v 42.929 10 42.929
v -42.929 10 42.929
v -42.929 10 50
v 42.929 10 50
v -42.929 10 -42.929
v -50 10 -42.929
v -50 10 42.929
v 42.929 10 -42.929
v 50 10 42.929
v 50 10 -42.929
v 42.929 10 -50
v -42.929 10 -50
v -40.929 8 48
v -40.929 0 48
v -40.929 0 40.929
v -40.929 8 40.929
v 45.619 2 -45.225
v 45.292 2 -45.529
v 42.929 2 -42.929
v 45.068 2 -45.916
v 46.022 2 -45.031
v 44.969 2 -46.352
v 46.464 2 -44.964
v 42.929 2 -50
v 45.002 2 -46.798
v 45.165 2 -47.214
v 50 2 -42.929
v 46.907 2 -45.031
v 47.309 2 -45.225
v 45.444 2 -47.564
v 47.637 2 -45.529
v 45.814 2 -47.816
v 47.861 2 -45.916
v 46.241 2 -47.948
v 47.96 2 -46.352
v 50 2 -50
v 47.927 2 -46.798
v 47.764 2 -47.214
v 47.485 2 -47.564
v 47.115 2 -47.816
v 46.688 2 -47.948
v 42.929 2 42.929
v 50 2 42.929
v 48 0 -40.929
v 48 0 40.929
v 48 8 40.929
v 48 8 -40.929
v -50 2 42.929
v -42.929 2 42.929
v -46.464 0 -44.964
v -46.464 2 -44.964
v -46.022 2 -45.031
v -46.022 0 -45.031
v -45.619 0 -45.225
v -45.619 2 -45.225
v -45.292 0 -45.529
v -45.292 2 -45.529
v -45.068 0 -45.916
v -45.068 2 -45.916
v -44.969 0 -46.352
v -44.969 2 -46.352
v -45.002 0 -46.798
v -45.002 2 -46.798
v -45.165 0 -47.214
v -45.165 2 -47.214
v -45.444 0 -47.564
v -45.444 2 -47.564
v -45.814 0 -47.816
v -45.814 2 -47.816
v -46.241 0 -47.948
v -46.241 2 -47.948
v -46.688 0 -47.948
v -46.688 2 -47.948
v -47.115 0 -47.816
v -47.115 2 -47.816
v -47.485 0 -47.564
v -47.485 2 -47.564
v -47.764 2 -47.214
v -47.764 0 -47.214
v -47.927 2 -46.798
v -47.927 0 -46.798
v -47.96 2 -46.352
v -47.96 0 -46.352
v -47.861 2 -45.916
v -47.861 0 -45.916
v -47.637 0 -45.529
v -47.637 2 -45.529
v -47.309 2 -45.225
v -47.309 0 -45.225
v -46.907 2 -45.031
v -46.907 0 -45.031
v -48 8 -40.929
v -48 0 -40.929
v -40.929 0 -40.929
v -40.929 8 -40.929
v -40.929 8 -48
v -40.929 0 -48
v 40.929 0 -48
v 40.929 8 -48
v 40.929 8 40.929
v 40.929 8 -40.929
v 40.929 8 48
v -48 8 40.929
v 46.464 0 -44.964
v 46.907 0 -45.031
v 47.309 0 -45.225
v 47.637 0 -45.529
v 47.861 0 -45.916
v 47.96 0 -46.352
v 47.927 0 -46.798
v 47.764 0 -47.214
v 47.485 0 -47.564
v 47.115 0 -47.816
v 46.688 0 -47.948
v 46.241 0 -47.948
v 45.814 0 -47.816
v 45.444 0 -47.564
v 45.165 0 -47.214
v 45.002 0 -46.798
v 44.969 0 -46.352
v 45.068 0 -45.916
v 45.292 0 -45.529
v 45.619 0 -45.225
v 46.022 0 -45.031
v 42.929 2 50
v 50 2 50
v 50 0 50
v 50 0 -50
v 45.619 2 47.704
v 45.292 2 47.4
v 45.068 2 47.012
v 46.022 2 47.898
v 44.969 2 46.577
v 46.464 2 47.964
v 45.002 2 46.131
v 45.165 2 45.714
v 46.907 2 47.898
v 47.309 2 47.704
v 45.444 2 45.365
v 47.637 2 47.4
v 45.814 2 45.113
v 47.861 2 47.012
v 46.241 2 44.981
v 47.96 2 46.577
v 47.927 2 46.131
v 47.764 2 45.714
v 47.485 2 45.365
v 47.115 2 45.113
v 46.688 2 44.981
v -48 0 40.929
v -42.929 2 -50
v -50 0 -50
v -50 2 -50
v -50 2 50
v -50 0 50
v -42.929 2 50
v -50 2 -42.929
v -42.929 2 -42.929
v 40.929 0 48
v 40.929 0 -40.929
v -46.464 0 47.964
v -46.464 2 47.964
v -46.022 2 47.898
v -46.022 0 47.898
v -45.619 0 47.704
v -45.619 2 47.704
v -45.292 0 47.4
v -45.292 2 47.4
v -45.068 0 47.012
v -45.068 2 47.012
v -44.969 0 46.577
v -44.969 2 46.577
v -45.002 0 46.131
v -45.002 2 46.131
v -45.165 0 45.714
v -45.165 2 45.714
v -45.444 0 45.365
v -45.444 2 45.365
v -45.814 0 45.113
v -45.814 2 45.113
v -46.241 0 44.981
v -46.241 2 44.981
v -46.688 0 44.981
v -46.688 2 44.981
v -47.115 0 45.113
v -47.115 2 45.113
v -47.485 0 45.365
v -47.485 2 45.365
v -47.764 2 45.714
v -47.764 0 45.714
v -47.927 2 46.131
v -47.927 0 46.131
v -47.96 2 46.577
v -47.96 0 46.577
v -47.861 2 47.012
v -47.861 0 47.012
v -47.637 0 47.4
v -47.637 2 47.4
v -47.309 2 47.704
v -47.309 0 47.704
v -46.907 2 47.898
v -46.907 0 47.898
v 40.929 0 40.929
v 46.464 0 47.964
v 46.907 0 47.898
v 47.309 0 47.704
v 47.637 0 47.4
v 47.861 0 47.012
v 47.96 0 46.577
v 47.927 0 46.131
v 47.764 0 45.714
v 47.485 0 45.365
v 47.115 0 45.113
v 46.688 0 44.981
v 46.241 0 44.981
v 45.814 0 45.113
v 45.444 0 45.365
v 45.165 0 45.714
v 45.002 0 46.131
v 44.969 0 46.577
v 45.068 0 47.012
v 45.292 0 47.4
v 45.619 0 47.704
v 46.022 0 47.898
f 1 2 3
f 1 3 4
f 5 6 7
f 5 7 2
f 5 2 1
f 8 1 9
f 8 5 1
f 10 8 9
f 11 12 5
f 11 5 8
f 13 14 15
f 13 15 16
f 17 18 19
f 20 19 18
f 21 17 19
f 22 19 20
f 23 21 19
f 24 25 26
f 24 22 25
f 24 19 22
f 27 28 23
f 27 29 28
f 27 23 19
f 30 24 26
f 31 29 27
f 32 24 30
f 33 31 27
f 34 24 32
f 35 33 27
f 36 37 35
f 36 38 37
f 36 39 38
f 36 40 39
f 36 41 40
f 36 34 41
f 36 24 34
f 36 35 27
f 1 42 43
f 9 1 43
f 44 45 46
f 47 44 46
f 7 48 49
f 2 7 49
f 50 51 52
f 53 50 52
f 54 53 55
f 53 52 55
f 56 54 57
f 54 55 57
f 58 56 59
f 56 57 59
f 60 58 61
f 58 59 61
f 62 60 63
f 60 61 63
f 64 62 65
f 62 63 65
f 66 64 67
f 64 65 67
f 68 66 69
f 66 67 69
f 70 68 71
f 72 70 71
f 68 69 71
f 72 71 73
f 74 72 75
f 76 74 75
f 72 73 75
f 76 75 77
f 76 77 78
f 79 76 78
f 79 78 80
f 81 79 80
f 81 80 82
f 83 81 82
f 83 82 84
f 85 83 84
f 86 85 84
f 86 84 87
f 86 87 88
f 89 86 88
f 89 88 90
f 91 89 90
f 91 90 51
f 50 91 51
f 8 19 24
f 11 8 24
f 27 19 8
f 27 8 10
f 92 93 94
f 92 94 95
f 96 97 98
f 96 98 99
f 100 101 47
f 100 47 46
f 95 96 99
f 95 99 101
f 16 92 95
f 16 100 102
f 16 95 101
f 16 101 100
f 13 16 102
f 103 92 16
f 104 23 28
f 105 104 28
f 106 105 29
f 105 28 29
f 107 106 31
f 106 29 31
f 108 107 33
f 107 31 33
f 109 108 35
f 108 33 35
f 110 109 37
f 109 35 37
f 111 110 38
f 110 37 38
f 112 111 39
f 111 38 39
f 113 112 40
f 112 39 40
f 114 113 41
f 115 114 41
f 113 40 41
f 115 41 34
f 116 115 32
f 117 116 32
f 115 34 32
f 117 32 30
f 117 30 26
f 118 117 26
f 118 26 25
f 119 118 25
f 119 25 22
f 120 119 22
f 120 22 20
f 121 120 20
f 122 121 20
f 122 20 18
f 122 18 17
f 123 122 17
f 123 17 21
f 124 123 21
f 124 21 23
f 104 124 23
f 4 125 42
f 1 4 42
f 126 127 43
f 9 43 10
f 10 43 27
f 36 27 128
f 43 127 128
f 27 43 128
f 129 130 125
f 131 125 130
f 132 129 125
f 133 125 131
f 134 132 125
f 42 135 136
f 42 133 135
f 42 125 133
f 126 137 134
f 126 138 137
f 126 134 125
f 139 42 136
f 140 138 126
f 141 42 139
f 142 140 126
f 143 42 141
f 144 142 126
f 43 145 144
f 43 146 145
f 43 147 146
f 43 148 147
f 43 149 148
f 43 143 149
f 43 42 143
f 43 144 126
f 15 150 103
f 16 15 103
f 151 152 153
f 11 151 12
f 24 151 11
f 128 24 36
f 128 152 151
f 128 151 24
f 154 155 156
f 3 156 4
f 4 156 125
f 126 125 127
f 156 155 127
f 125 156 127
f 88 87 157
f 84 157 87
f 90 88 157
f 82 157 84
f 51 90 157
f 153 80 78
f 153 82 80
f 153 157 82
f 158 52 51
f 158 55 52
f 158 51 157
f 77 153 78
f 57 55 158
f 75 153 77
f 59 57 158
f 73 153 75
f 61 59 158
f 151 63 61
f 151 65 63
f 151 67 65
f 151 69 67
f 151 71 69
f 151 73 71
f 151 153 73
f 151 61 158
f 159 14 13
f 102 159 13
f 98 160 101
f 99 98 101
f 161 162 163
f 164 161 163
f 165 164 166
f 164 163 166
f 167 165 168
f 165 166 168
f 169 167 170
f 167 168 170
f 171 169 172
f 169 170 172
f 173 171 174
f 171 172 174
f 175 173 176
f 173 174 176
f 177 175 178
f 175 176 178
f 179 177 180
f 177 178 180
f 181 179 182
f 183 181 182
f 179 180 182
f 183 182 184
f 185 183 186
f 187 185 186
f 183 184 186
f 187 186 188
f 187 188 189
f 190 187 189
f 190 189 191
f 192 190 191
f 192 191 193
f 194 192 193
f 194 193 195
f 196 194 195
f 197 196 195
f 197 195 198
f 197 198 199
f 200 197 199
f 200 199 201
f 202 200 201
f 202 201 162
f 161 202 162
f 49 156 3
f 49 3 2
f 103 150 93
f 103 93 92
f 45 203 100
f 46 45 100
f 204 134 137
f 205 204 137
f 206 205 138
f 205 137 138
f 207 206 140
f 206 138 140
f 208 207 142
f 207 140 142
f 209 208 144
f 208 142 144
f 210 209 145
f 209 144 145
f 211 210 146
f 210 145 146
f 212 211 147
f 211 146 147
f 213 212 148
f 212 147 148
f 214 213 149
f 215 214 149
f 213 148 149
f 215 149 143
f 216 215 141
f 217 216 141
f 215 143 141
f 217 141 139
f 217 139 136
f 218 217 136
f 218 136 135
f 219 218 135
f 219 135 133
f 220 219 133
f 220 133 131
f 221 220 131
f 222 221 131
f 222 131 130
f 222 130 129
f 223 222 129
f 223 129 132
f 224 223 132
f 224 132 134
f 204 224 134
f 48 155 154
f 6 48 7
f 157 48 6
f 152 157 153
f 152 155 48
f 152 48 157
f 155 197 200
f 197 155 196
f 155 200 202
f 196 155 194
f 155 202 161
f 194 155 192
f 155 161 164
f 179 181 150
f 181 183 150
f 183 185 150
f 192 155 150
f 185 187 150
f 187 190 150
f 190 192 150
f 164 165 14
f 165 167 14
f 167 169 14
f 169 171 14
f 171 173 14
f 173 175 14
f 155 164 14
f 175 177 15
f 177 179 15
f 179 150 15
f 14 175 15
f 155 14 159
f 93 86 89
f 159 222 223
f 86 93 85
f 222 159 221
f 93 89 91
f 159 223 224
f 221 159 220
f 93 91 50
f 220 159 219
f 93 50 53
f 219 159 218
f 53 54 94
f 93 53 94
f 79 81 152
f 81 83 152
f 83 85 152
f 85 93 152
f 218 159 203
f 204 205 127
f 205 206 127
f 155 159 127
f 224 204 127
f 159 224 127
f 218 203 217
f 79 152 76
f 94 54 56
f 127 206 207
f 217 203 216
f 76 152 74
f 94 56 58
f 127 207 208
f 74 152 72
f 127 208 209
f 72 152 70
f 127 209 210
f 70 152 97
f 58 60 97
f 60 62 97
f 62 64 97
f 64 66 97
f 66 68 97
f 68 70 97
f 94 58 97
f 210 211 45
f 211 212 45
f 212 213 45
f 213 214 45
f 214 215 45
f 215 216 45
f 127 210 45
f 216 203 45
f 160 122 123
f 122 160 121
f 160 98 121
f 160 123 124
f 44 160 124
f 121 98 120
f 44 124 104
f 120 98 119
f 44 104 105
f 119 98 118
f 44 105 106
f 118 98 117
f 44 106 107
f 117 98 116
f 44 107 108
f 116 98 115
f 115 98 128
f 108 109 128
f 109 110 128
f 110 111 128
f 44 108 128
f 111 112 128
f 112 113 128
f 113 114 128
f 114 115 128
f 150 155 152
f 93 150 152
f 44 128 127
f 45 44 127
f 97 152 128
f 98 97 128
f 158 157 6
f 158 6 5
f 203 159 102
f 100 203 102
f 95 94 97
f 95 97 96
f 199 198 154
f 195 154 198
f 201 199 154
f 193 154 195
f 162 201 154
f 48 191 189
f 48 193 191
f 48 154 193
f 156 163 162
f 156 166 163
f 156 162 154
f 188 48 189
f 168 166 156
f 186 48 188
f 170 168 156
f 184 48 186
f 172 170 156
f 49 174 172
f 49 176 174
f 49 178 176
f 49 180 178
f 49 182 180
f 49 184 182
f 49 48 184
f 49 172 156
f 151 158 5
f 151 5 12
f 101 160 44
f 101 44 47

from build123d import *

# Parameters (mm, degrees)
CROQUIS1_W              = 100
CROQUIS1_H              = 100
SALIENTE_EXTRUIR1_DEPTH = 10
CROQUIS2_R              = 1.5
CORTAR_EXTRUIR1_DEPTH   = 30
CROQUIS3_W              = 7.071067812
CROQUIS3_H              = 7.071067812
CORTAR_EXTRUIR2_DEPTH   = 8
VACIADO1_START          = -48
VACIADO1_OUTLINE_W      = 8
VACIADO1_OUTLINE_H      = 81.857864376
VACIADO1_DEPTH          = 96
VACIADO1_START_2        = -40.928932188
VACIADO1_2_OUTLINE_W    = 8
VACIADO1_2_OUTLINE_H    = 7.071067812
VACIADO1_2_DEPTH        = 81.857864376


# Read off the part's stored shape, not the designer's step: Vaciado1
with BuildPart() as part:
    # Croquis1 → Saliente-Extruir1 (new body)
    with BuildSketch(Plane(origin=(0, 0, 0), x_dir=(1, 0, 0), z_dir=(0, 1, 0))):
        Rectangle(CROQUIS1_W, CROQUIS1_H)
    extrude(amount=SALIENTE_EXTRUIR1_DEPTH)

    # Croquis2 → Cortar-Extruir1 (cut)
    with BuildSketch(Plane(origin=(0, 10, 0), x_dir=(1, 0, 0), z_dir=(0, 1, 0))):
        with Locations(Location((-46.464466094, -46.464466094, 0), (0, 0, 270))):
            Circle(CROQUIS2_R)
        with Locations(Location((-46.464466094, 46.464466094, 0), (0, 0, 270))):
            Circle(CROQUIS2_R)
        with Locations(Location((46.464466094, 46.464466094, 0), (0, 0, 270))):
            Circle(CROQUIS2_R)
        with Locations(Location((46.464466094, -46.464466094, 0), (0, 0, 270))):
            Circle(CROQUIS2_R)
    extrude(amount=-CORTAR_EXTRUIR1_DEPTH, mode=Mode.SUBTRACT)

    # Croquis3 → Cortar-Extruir2 (cut)
    with BuildSketch(Plane(origin=(0, 10, 0), x_dir=(1, 0, 0), z_dir=(0, 1, 0))):
        with Locations((-46.464466094, -46.464466094)):
            Rectangle(CROQUIS3_W, CROQUIS3_H)
        with Locations((-46.464466094, 46.464466094)):
            Rectangle(CROQUIS3_W, CROQUIS3_H)
        with Locations((46.464466094, 46.464466094)):
            Rectangle(CROQUIS3_W, CROQUIS3_H)
        with Locations((46.464466094, -46.464466094)):
            Rectangle(CROQUIS3_W, CROQUIS3_H)
    extrude(amount=-CORTAR_EXTRUIR2_DEPTH, mode=Mode.SUBTRACT)

    # Vaciado1 outline → Vaciado1 (cut)
    with BuildSketch(Plane.YZ.offset(VACIADO1_START)):
        with Locations((4, 0)):
            Rectangle(VACIADO1_OUTLINE_W, VACIADO1_OUTLINE_H)
    extrude(amount=VACIADO1_DEPTH, mode=Mode.SUBTRACT)

    # Vaciado1 2 outline → Vaciado1 2 (cut)
    with BuildSketch(Plane.YZ.offset(VACIADO1_START_2)):
        with Locations((4, -44.464466094)):
            Rectangle(VACIADO1_2_OUTLINE_W, VACIADO1_2_OUTLINE_H)
        with Locations((4, 44.464466094)):
            Rectangle(VACIADO1_2_OUTLINE_W, VACIADO1_2_OUTLINE_H)
    extrude(amount=VACIADO1_2_DEPTH, mode=Mode.SUBTRACT)


solid = part.part
